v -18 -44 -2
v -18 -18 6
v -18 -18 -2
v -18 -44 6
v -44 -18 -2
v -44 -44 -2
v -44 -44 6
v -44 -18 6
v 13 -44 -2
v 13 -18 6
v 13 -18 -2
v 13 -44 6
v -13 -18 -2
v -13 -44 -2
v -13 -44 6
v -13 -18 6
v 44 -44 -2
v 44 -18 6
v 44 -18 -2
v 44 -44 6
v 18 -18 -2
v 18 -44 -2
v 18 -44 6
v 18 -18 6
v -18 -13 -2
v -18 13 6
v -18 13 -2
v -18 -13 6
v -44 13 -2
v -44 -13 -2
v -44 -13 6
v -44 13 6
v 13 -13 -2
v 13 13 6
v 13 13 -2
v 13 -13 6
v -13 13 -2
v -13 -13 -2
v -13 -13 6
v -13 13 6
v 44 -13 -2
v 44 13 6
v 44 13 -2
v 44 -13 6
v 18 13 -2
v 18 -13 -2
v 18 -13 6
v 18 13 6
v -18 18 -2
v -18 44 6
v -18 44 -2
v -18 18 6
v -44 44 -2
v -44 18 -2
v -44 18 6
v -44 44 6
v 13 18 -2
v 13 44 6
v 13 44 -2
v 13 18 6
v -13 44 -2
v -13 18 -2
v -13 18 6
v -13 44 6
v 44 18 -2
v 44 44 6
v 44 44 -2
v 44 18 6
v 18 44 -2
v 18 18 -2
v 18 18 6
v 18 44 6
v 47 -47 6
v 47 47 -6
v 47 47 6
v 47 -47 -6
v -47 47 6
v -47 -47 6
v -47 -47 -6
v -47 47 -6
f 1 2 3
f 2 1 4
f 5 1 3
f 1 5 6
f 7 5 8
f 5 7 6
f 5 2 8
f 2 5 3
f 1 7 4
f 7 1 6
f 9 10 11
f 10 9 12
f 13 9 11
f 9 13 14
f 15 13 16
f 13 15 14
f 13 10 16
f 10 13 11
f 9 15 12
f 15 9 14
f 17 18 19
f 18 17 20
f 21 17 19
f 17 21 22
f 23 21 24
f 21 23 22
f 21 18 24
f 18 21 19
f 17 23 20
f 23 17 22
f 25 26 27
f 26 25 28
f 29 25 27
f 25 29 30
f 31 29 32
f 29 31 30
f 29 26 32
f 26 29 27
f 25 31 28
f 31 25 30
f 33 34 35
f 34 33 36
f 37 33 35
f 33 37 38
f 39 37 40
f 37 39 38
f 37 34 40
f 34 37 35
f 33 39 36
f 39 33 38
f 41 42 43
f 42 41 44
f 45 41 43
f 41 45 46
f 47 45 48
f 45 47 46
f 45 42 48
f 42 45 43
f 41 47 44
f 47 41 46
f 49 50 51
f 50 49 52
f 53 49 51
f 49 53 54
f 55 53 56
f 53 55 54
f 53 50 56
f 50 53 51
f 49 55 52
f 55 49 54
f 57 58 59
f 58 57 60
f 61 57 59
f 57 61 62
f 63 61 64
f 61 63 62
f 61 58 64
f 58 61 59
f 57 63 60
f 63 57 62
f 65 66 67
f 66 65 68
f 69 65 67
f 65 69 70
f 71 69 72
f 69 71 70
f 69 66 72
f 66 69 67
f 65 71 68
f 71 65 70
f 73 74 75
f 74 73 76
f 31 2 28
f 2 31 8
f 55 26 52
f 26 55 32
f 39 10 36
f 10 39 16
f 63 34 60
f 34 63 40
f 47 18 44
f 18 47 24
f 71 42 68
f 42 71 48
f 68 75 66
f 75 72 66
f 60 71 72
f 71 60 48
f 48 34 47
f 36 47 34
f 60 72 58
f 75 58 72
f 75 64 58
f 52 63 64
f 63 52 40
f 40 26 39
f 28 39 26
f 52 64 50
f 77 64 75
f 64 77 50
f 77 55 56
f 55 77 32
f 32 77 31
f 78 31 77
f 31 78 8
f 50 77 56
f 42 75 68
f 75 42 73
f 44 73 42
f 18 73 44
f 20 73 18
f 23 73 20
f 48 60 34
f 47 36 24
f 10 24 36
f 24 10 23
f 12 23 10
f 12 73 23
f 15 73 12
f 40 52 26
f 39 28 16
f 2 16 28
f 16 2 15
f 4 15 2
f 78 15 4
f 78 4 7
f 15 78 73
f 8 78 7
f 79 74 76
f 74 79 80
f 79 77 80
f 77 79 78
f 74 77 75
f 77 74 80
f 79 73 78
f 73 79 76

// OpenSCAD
$fn = 32;

// ----------------------------------------------------------------------
// Pocket plate 94 x 94 x 12
// 3 x 3 pockets 26 mm square, 8 mm deep
// ----------------------------------------------------------------------

// --- parameters (mm) ---
thickness = 12;  // plate thickness
floor_t = 4;     // material left under each pocket
pocket = 26;     // pocket side length
pitch_x = 31;    // pocket pitch along X
pitch_y = 31;    // pocket pitch along Y
cols = 3;        // pockets per row
rows = 3;        // rows of pockets

// --- derived feature positions (mm) ---
depth = thickness - floor_t;        // = 8   pocket depth, down to the floor
span_x = (cols - 1) * pitch_x;      // = 62   distance between outer pockets
span_y = (rows - 1) * pitch_y;      // = 62   distance between outer pocket rows
origin_x = -span_x / 2;             // = -31   X of the first pocket
origin_y = -span_y / 2;             // = -31   Y of the first pocket
plate = [span_x + pocket + 6, span_y + pocket + 6, thickness];  // = [94, 94, 12]   overall size: pockets plus 3 mm of wall on each side
feature_centers = [
  [origin_x + 0 * pitch_x, origin_y + 0 * pitch_y],
  [origin_x + 1 * pitch_x, origin_y + 0 * pitch_y],
  [origin_x + 2 * pitch_x, origin_y + 0 * pitch_y],
  [origin_x + 0 * pitch_x, origin_y + 1 * pitch_y],
  [origin_x + 1 * pitch_x, origin_y + 1 * pitch_y],
  [origin_x + 2 * pitch_x, origin_y + 1 * pitch_y],
  [origin_x + 0 * pitch_x, origin_y + 2 * pitch_y],
  [origin_x + 1 * pitch_x, origin_y + 2 * pitch_y],
  [origin_x + 2 * pitch_x, origin_y + 2 * pitch_y]
];   // pocket centres, used verbatim by the cutter loop

// plate outline, then one pocket per centre in feature_centers
difference() {
  cube(plate, center = true);
  for (centre = feature_centers)
    translate([centre[0] - pocket / 2, centre[1] - pocket / 2, plate[2] / 2 - depth])
      cube([pocket, pocket, depth + 1]);  // centred on the declared pocket centre
}
